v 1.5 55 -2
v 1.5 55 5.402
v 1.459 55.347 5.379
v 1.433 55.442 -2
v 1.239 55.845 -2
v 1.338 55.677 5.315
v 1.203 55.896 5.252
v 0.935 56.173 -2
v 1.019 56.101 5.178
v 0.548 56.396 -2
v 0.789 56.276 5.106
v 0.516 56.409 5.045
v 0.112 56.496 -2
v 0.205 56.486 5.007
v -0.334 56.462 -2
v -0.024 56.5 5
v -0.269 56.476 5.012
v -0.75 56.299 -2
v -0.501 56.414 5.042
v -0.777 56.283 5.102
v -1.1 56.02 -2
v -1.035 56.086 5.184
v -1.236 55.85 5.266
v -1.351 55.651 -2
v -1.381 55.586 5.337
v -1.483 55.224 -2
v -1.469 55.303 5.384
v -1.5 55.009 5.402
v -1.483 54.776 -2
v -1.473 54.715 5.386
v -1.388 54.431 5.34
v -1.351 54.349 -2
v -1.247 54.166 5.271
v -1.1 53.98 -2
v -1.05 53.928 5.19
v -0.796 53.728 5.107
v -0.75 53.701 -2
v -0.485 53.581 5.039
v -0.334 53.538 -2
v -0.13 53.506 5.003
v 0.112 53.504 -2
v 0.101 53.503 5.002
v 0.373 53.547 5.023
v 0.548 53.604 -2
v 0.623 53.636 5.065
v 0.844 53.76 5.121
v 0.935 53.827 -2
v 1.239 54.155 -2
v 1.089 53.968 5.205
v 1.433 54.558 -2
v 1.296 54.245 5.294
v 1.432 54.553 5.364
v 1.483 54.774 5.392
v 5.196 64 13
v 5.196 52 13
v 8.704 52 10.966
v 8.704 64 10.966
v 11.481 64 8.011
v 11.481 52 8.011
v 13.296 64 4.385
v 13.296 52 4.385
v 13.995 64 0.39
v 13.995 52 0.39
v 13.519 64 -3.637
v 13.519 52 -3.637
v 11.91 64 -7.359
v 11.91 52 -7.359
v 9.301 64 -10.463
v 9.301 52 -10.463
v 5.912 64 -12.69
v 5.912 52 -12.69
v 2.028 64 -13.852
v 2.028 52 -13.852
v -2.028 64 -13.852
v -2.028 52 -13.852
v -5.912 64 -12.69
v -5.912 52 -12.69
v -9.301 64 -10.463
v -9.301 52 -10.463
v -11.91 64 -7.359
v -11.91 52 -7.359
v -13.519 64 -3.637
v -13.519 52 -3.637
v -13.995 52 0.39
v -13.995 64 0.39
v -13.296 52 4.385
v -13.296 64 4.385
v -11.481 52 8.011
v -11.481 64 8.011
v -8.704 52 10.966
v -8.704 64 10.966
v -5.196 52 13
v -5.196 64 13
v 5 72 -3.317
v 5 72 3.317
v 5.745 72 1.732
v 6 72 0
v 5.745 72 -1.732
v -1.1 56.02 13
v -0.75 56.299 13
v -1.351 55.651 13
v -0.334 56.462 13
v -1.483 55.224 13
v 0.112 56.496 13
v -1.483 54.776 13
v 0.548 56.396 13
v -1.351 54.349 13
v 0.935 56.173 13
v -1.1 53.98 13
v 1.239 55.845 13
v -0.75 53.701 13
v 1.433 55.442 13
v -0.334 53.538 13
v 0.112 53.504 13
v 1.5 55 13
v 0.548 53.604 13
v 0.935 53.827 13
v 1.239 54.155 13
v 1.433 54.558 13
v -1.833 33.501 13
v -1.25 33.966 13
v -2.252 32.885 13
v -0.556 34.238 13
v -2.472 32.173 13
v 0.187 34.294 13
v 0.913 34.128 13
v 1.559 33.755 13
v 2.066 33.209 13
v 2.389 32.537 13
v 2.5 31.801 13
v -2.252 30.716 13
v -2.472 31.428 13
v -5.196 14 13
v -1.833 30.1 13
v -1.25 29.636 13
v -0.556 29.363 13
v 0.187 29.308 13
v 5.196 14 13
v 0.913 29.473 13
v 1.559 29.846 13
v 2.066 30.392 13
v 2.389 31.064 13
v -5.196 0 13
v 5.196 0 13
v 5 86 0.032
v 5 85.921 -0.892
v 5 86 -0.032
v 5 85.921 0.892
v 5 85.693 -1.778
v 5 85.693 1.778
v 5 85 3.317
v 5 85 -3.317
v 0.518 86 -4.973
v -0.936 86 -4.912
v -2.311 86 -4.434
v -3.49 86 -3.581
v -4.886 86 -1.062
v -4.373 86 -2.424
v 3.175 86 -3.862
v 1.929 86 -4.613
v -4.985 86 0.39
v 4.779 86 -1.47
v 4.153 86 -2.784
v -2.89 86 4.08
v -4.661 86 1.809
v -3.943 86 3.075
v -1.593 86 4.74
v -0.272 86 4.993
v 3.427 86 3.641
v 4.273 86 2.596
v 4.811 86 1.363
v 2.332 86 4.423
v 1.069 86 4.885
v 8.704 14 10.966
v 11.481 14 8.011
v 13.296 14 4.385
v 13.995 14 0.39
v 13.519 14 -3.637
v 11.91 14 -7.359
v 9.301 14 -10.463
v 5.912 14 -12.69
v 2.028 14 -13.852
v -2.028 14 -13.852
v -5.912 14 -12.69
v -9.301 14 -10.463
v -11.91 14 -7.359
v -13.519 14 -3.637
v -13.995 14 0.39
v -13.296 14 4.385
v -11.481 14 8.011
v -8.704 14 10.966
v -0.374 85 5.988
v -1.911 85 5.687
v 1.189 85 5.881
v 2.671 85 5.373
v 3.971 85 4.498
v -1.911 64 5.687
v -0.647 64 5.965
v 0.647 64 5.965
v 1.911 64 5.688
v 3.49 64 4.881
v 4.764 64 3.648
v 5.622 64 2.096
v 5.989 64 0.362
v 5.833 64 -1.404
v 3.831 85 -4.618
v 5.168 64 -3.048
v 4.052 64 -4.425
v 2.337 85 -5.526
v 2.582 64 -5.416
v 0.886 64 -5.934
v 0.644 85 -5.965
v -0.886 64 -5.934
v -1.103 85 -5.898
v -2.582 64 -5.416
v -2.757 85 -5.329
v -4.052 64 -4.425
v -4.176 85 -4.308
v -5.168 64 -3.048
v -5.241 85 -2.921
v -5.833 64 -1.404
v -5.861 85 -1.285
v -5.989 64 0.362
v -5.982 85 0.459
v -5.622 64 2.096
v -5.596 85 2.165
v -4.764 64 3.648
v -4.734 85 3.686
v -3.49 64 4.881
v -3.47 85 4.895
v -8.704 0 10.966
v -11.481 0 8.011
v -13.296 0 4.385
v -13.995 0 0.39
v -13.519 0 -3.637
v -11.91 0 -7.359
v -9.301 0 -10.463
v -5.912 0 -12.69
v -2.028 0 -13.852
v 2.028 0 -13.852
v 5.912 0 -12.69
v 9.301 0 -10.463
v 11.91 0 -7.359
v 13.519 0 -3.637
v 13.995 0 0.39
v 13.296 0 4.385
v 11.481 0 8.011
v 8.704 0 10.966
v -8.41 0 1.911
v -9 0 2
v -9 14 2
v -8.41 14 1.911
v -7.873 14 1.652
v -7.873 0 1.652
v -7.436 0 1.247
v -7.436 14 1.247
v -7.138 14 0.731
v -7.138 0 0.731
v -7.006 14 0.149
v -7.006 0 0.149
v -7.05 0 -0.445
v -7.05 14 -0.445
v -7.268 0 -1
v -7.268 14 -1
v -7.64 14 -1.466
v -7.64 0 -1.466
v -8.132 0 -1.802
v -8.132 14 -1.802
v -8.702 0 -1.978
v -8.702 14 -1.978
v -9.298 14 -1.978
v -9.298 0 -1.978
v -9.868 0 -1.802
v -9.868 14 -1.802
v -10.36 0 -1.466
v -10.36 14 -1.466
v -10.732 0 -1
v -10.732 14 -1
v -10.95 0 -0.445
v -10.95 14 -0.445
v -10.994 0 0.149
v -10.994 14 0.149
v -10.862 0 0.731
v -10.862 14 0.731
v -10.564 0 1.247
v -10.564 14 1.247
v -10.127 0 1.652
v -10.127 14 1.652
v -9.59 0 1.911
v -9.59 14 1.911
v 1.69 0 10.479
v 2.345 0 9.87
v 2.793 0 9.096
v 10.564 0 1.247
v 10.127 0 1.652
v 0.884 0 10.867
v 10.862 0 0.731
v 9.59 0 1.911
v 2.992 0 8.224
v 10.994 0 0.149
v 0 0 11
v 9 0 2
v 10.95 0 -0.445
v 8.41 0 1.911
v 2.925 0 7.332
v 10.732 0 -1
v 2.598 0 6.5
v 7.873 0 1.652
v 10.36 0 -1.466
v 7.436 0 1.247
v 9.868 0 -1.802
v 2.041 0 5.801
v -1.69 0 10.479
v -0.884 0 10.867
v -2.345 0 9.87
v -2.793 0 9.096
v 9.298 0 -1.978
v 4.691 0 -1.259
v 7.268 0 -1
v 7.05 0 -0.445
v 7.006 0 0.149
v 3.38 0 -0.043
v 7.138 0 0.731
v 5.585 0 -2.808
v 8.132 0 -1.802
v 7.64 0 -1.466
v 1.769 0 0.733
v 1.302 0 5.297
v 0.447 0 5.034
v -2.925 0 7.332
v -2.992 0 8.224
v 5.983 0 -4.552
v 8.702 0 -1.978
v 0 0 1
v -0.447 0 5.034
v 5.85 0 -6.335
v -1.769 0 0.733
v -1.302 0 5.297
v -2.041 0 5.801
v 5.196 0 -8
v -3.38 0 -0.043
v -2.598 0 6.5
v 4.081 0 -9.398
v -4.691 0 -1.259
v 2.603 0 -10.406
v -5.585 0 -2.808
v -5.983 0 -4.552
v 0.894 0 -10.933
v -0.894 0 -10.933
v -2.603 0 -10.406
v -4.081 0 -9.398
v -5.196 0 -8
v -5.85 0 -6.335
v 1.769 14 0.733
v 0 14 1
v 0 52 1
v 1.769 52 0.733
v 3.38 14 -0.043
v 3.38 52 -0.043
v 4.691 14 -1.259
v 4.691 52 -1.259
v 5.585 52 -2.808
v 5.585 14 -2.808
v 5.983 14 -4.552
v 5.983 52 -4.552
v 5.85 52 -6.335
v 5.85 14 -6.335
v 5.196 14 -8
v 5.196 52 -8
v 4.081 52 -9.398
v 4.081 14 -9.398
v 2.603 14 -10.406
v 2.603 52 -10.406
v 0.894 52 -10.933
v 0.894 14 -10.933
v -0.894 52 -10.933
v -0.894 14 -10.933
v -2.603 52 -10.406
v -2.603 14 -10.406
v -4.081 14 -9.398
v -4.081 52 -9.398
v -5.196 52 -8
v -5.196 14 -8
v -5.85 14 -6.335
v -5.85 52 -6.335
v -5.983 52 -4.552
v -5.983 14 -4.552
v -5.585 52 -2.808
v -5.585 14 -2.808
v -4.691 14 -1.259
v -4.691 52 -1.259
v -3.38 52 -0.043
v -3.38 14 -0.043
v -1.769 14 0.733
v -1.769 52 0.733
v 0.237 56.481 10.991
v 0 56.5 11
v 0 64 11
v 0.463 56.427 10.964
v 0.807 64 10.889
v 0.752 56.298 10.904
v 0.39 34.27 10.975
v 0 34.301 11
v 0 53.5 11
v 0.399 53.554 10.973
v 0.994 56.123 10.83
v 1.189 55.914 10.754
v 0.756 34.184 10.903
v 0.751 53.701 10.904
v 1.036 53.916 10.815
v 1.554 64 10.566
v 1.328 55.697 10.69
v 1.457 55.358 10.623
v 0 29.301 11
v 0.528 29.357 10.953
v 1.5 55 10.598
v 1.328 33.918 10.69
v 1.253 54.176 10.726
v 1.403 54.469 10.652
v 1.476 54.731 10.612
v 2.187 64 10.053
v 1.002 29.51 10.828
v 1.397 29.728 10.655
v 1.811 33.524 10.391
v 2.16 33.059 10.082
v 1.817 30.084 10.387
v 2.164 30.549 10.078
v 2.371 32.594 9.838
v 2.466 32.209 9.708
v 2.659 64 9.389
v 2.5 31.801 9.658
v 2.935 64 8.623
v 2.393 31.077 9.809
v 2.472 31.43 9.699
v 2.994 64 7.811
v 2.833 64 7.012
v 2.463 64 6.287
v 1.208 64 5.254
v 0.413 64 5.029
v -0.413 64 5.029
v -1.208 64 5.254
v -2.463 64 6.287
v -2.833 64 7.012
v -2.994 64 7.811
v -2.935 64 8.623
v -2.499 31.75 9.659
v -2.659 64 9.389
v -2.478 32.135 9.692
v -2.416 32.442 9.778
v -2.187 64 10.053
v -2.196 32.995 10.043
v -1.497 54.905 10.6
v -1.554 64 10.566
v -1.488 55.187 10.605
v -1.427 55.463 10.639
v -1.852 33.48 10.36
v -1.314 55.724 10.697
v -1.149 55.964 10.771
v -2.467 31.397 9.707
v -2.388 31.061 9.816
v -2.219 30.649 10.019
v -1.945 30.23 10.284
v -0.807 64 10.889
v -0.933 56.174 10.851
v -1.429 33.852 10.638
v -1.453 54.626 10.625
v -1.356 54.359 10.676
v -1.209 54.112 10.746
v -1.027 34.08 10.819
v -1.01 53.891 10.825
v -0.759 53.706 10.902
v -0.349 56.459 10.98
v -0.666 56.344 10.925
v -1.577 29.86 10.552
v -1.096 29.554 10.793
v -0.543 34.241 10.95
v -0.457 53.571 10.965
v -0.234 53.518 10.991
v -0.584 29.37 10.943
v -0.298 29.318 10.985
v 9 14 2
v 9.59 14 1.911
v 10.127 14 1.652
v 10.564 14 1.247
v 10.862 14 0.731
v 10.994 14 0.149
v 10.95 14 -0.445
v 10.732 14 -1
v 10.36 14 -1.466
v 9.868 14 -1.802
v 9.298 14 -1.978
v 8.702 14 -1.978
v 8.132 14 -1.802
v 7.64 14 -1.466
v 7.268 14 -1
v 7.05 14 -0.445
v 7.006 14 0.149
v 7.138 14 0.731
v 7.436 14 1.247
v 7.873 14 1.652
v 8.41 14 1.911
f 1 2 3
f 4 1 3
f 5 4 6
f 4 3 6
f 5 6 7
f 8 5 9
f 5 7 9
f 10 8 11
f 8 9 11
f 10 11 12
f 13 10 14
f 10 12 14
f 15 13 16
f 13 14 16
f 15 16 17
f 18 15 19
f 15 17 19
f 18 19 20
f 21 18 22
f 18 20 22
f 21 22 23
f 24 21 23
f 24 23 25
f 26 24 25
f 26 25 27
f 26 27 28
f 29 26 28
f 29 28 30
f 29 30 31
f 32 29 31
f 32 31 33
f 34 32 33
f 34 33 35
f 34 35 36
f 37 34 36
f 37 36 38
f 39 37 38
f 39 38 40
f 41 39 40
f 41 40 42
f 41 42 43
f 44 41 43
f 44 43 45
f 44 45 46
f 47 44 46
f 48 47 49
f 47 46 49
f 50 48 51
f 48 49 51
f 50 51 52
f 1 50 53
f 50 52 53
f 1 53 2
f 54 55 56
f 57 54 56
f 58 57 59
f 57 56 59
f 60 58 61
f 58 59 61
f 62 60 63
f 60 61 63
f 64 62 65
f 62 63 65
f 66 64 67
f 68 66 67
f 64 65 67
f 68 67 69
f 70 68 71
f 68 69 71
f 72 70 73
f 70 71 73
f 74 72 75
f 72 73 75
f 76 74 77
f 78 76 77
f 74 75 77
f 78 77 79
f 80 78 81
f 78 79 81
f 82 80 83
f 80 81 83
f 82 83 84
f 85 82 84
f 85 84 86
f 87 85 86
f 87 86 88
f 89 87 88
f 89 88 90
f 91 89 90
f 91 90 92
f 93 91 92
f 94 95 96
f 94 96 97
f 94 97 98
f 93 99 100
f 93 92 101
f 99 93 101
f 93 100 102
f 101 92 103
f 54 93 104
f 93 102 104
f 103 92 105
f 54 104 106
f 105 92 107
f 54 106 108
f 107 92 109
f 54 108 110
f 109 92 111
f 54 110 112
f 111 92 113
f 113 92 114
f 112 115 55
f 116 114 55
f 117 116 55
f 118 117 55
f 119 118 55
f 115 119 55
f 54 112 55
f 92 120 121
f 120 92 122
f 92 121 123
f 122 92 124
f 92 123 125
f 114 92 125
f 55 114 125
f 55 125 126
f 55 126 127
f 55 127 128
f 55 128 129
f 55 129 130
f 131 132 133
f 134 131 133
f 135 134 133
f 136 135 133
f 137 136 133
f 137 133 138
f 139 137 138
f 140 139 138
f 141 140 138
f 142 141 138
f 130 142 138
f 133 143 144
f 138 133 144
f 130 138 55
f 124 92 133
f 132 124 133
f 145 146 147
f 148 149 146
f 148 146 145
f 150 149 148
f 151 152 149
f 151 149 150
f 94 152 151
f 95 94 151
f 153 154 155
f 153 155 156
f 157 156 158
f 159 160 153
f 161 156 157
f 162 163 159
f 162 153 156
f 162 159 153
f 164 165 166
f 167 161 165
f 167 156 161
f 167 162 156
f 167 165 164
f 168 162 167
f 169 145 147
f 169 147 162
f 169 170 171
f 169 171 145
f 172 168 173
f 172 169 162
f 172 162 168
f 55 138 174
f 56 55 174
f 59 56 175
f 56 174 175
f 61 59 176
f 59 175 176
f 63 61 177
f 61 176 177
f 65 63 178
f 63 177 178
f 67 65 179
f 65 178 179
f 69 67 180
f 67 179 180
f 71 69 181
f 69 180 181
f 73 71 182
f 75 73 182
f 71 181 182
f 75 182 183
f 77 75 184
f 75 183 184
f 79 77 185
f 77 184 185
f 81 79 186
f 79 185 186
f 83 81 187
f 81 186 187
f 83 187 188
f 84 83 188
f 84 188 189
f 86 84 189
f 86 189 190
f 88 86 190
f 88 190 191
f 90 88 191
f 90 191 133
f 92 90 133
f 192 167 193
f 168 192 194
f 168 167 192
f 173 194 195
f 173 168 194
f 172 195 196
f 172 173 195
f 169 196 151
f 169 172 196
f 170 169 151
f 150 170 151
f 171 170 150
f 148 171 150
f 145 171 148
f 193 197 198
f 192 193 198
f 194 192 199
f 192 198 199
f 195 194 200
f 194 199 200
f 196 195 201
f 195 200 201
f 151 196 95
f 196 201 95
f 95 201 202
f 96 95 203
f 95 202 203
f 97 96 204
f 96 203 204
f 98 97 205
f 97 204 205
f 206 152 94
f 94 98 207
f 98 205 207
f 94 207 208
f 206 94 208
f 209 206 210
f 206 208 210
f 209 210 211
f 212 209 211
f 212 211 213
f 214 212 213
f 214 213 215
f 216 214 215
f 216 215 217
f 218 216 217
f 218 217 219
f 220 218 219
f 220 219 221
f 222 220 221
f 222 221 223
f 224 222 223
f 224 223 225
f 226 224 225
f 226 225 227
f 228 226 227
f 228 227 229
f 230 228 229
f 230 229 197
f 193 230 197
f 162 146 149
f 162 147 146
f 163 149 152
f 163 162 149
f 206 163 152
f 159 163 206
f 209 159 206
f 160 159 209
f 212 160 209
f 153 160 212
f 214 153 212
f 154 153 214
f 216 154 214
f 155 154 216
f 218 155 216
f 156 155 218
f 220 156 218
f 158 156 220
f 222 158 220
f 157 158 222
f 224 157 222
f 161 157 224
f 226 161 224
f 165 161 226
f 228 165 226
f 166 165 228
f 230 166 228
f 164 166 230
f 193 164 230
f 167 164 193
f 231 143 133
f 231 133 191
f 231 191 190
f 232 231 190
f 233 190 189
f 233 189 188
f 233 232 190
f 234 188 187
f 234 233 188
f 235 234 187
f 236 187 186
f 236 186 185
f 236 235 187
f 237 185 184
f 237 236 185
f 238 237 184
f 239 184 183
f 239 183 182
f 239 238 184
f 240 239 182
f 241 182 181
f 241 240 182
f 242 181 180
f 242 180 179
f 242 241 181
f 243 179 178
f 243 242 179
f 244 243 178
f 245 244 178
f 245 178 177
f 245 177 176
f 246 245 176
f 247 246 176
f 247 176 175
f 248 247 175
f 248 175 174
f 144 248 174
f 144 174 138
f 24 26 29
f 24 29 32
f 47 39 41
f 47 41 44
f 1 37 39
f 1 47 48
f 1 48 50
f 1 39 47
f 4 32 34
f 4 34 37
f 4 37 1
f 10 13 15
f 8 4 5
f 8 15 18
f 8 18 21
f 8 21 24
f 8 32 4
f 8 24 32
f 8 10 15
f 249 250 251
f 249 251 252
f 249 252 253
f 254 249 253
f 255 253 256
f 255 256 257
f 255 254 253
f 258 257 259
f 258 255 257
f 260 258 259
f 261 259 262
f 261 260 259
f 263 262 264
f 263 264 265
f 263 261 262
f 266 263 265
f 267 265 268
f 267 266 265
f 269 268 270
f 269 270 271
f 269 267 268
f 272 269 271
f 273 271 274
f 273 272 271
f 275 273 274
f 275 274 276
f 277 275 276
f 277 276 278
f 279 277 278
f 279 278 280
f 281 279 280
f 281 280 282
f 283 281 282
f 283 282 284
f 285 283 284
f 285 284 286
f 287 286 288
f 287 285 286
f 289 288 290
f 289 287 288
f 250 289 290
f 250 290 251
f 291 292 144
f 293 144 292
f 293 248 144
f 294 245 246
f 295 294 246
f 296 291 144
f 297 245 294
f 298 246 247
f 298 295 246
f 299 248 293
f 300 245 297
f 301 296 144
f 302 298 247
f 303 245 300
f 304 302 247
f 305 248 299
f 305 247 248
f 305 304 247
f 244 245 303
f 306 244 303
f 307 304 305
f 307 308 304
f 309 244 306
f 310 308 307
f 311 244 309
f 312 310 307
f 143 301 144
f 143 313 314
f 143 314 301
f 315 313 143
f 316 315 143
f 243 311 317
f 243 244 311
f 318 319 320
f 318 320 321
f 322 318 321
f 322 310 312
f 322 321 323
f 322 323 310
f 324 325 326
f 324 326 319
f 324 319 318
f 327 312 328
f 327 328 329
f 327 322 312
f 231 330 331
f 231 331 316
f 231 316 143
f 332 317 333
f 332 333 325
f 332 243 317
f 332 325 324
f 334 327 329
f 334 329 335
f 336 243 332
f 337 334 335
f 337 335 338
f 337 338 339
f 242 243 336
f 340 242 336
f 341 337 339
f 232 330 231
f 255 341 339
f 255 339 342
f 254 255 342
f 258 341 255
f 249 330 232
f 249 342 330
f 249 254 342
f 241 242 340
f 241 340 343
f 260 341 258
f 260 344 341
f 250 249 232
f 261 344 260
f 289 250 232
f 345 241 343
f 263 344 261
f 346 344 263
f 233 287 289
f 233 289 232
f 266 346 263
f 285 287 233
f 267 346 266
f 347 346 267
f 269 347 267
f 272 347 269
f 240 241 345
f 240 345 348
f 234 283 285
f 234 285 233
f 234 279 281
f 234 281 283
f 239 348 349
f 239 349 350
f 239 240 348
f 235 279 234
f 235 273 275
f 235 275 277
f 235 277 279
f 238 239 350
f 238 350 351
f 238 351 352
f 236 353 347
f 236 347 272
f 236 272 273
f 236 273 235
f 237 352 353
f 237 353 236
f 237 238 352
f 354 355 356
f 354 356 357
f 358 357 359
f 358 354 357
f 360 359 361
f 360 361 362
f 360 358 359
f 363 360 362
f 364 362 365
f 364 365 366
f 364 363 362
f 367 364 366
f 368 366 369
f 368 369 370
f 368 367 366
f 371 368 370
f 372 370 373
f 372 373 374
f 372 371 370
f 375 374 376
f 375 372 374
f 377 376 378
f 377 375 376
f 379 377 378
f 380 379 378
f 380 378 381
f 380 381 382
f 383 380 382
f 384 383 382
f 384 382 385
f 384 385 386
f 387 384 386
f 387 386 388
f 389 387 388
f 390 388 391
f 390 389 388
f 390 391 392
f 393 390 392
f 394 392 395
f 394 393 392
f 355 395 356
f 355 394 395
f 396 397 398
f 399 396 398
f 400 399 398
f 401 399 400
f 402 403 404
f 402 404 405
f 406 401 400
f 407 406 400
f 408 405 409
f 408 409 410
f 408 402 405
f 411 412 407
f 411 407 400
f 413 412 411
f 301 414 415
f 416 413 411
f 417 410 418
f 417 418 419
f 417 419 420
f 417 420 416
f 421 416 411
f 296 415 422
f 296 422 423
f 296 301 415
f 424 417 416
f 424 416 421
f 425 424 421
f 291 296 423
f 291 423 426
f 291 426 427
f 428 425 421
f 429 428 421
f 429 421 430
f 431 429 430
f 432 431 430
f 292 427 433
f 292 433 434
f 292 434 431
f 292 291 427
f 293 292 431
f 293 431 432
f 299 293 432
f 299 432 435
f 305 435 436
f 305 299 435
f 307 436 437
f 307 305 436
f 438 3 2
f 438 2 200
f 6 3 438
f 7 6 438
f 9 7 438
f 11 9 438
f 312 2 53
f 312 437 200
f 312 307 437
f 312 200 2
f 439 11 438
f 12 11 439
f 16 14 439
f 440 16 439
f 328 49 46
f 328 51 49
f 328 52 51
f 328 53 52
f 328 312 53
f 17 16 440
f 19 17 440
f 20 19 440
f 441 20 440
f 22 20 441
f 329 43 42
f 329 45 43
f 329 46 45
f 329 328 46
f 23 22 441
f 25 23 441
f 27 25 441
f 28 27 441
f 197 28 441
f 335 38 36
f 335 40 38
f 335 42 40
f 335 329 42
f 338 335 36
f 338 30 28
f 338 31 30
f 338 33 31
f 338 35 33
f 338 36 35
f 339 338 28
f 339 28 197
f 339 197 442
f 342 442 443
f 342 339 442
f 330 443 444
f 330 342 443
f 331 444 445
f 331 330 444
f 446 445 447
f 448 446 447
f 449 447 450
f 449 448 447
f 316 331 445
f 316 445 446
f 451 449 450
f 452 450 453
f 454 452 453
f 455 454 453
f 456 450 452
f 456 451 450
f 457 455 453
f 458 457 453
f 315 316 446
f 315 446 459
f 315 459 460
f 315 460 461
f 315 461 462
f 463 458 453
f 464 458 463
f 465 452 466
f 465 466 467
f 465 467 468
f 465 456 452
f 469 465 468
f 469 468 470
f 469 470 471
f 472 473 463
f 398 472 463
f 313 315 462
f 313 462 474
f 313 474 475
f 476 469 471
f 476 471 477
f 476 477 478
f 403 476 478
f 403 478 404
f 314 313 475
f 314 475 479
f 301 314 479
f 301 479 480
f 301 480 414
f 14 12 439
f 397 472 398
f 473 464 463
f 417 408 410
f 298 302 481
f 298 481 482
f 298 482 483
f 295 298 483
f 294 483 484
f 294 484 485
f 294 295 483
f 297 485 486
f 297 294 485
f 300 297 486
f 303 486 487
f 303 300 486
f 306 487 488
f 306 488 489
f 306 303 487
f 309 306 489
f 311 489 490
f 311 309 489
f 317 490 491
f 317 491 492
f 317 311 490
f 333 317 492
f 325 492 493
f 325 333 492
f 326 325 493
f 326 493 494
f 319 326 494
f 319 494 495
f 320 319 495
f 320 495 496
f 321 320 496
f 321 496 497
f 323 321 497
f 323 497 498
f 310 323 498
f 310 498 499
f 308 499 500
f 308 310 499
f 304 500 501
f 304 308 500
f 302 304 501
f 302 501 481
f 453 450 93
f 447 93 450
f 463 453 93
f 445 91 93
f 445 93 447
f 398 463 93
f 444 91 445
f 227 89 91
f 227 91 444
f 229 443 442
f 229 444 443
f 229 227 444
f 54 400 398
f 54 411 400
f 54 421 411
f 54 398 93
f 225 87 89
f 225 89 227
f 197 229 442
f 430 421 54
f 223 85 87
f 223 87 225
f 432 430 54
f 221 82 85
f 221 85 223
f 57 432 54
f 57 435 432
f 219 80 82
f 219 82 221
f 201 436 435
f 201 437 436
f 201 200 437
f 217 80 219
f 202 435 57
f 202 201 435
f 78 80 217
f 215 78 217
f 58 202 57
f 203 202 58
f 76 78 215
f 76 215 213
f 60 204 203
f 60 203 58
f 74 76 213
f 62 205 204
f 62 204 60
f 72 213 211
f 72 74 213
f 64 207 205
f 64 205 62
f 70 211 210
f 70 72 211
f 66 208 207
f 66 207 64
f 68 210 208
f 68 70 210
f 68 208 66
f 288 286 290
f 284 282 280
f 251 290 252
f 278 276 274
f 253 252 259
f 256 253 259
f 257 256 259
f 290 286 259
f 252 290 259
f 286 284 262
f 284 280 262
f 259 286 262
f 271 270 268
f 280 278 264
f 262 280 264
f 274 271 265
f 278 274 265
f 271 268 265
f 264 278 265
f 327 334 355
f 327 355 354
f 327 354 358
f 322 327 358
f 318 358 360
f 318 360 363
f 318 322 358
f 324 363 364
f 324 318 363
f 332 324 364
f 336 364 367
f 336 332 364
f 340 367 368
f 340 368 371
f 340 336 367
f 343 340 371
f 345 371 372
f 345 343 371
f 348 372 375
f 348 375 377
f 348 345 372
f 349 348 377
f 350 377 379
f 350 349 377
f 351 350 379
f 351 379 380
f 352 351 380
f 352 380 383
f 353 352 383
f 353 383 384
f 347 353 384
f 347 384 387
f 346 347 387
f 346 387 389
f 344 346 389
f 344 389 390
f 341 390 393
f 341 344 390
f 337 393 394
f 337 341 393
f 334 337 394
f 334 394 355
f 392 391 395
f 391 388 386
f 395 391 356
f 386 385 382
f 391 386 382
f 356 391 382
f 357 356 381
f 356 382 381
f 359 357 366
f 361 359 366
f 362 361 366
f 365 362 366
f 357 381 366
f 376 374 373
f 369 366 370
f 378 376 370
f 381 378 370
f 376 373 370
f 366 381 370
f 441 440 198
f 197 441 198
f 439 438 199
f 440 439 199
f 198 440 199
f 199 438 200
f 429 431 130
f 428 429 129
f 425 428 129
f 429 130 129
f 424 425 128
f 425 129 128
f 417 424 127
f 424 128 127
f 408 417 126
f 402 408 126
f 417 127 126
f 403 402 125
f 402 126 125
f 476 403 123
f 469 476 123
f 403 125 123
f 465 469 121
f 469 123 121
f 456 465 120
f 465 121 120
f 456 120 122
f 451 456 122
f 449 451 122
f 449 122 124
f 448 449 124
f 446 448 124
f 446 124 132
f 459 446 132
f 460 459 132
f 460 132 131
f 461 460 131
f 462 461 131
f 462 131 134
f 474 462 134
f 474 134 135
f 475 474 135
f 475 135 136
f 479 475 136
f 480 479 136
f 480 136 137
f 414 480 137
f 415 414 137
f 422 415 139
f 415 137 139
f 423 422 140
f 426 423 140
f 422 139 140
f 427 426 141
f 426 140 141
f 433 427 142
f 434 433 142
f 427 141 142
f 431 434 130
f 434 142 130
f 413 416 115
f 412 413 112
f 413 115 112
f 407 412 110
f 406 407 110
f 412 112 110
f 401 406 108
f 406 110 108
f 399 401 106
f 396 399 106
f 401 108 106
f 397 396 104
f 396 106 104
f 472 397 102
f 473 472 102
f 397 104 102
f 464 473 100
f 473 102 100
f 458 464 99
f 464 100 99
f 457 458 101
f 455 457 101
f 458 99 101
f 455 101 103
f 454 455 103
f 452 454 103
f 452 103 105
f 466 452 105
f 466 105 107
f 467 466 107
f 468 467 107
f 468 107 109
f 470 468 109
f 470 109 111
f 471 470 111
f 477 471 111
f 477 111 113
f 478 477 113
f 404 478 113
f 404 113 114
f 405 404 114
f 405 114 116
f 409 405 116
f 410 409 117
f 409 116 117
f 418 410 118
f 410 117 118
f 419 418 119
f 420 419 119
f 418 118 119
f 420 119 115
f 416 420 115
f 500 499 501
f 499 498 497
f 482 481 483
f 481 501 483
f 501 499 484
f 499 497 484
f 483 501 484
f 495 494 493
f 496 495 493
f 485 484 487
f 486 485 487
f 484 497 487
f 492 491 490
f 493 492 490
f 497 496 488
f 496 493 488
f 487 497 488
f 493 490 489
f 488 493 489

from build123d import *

# Parameters (mm, degrees)
SKETCH1_R           = 2
SKETCH1_R_2         = 6
SKETCH1_R_3         = 3
BOSS_EXTRUDE1_DEPTH = 14
SKETCH2_R           = 6
SKETCH2_R_2         = 3
BOSS_EXTRUDE2_DEPTH = 38
SKETCH3_R           = 3
BOSS_EXTRUDE3_DEPTH = 12
SKETCH4_R           = 6
BOSS_EXTRUDE4_DEPTH = 22
CUT_EXTRUDE1_START  = -14
CUT_EXTRUDE1_DEPTH  = 14
CHAMFER1_SIZE       = 1
SKETCH6_R           = 2.5
CUT_EXTRUDE2_DEPTH  = 5
SKETCH7_R           = 1.5
CUT_EXTRUDE3_DEPTH  = 15


with BuildPart() as part:
    # Sketch1 → Boss-Extrude1 (new body)
    with BuildSketch(Plane(origin=(0, 0, 0), x_dir=(1, 0, 0), z_dir=(0, 1, 0))):
        with BuildLine():
            Line((5.196152423, -13), (-5.196152423, -13))
            ThreePointArc((-5.196152423, -13), (0, 14), (5.196152423, -13))
        make_face()
        with Locations(Location((-9, 0, 0), (0, 0, 270))):
            Circle(SKETCH1_R, mode=Mode.SUBTRACT)
        with Locations(Location((9, 0, 0), (0, 0, 270))):
            Circle(SKETCH1_R, mode=Mode.SUBTRACT)
        with Locations(Location((0, 5, 0), (0, 0, 270))):
            Circle(SKETCH1_R_2, mode=Mode.SUBTRACT)
        with Locations(Location((0, -8, 0), (0, 0, 270))):
            Circle(SKETCH1_R_3, mode=Mode.SUBTRACT)
    extrude(amount=BOSS_EXTRUDE1_DEPTH)

    # Sketch2 → Boss-Extrude2 (add)
    with BuildSketch(Plane(origin=(0, 14, 0), x_dir=(1, 0, 0), z_dir=(0, 1, 0))):
        with BuildLine():
            Line((-5.196152423, -13), (5.196152423, -13))
            ThreePointArc((5.196152423, -13), (0, 14), (-5.196152423, -13))
        make_face()
        with Locations(Location((0, 5, 0), (0, 0, 270))):
            Circle(SKETCH2_R, mode=Mode.SUBTRACT)
        with Locations(Location((0, -8, 0), (0, 0, 270))):
            Circle(SKETCH2_R_2, mode=Mode.SUBTRACT)
    extrude(amount=BOSS_EXTRUDE2_DEPTH)

    # Sketch3 → Boss-Extrude3 (add)
    with BuildSketch(Plane(origin=(0, 52, 0), x_dir=(1, 0, 0), z_dir=(0, 1, 0))):
        with BuildLine():
            Line((-5.196152423, -13), (5.196152423, -13))
            ThreePointArc((5.196152423, -13), (0, 14), (-5.196152423, -13))
        make_face()
        with Locations(Location((0, -8, 0), (0, 0, 270))):
            Circle(SKETCH3_R, mode=Mode.SUBTRACT)
    extrude(amount=BOSS_EXTRUDE3_DEPTH)

    # Sketch4 → Boss-Extrude4 (add)
    with BuildSketch(Plane(origin=(0, 64, 0), x_dir=(1, 0, 0), z_dir=(0, 1, 0))):
        with Locations(Location((0, 0, 0), (0, 0, 251.426650281))):
            Circle(SKETCH4_R)
    extrude(amount=BOSS_EXTRUDE4_DEPTH)

    # Sketch5 → Cut-Extrude1 (cut)
    with BuildSketch(Plane(origin=(0, 86, 0), x_dir=(1, 0, 0), z_dir=(0, 1, 0)).offset(CUT_EXTRUDE1_START)):
        with BuildLine():
            Line((5, 3.31662479), (5, -3.31662479))
            ThreePointArc((5, -3.31662479), (6, 0), (5, 3.31662479))
        make_face()
    extrude(amount=CUT_EXTRUDE1_DEPTH, mode=Mode.SUBTRACT)

    # Chamfer1
    chamfer1_edges = [part.edges().sort_by_distance(p)[0] for p in [
        (-4.759608727, 86, -3.653234836),
    ]]
    chamfer(chamfer1_edges, length=CHAMFER1_SIZE - 0.0001)  # a hair under: the kernel refuses the full size

    # Sketch6 → Cut-Extrude2 (cut)
    with BuildSketch(Plane.XY.offset(13)):
        with Locations((0, 31.800606355)):
            Circle(SKETCH6_R)
    extrude(amount=-CUT_EXTRUDE2_DEPTH, mode=Mode.SUBTRACT)

    # Sketch7 → Cut-Extrude3 (cut)
    with BuildSketch(Plane.XY.offset(13)):
        with Locations((0, 55)):
            Circle(SKETCH7_R)
    extrude(amount=-CUT_EXTRUDE3_DEPTH, mode=Mode.SUBTRACT)


solid = part.part
